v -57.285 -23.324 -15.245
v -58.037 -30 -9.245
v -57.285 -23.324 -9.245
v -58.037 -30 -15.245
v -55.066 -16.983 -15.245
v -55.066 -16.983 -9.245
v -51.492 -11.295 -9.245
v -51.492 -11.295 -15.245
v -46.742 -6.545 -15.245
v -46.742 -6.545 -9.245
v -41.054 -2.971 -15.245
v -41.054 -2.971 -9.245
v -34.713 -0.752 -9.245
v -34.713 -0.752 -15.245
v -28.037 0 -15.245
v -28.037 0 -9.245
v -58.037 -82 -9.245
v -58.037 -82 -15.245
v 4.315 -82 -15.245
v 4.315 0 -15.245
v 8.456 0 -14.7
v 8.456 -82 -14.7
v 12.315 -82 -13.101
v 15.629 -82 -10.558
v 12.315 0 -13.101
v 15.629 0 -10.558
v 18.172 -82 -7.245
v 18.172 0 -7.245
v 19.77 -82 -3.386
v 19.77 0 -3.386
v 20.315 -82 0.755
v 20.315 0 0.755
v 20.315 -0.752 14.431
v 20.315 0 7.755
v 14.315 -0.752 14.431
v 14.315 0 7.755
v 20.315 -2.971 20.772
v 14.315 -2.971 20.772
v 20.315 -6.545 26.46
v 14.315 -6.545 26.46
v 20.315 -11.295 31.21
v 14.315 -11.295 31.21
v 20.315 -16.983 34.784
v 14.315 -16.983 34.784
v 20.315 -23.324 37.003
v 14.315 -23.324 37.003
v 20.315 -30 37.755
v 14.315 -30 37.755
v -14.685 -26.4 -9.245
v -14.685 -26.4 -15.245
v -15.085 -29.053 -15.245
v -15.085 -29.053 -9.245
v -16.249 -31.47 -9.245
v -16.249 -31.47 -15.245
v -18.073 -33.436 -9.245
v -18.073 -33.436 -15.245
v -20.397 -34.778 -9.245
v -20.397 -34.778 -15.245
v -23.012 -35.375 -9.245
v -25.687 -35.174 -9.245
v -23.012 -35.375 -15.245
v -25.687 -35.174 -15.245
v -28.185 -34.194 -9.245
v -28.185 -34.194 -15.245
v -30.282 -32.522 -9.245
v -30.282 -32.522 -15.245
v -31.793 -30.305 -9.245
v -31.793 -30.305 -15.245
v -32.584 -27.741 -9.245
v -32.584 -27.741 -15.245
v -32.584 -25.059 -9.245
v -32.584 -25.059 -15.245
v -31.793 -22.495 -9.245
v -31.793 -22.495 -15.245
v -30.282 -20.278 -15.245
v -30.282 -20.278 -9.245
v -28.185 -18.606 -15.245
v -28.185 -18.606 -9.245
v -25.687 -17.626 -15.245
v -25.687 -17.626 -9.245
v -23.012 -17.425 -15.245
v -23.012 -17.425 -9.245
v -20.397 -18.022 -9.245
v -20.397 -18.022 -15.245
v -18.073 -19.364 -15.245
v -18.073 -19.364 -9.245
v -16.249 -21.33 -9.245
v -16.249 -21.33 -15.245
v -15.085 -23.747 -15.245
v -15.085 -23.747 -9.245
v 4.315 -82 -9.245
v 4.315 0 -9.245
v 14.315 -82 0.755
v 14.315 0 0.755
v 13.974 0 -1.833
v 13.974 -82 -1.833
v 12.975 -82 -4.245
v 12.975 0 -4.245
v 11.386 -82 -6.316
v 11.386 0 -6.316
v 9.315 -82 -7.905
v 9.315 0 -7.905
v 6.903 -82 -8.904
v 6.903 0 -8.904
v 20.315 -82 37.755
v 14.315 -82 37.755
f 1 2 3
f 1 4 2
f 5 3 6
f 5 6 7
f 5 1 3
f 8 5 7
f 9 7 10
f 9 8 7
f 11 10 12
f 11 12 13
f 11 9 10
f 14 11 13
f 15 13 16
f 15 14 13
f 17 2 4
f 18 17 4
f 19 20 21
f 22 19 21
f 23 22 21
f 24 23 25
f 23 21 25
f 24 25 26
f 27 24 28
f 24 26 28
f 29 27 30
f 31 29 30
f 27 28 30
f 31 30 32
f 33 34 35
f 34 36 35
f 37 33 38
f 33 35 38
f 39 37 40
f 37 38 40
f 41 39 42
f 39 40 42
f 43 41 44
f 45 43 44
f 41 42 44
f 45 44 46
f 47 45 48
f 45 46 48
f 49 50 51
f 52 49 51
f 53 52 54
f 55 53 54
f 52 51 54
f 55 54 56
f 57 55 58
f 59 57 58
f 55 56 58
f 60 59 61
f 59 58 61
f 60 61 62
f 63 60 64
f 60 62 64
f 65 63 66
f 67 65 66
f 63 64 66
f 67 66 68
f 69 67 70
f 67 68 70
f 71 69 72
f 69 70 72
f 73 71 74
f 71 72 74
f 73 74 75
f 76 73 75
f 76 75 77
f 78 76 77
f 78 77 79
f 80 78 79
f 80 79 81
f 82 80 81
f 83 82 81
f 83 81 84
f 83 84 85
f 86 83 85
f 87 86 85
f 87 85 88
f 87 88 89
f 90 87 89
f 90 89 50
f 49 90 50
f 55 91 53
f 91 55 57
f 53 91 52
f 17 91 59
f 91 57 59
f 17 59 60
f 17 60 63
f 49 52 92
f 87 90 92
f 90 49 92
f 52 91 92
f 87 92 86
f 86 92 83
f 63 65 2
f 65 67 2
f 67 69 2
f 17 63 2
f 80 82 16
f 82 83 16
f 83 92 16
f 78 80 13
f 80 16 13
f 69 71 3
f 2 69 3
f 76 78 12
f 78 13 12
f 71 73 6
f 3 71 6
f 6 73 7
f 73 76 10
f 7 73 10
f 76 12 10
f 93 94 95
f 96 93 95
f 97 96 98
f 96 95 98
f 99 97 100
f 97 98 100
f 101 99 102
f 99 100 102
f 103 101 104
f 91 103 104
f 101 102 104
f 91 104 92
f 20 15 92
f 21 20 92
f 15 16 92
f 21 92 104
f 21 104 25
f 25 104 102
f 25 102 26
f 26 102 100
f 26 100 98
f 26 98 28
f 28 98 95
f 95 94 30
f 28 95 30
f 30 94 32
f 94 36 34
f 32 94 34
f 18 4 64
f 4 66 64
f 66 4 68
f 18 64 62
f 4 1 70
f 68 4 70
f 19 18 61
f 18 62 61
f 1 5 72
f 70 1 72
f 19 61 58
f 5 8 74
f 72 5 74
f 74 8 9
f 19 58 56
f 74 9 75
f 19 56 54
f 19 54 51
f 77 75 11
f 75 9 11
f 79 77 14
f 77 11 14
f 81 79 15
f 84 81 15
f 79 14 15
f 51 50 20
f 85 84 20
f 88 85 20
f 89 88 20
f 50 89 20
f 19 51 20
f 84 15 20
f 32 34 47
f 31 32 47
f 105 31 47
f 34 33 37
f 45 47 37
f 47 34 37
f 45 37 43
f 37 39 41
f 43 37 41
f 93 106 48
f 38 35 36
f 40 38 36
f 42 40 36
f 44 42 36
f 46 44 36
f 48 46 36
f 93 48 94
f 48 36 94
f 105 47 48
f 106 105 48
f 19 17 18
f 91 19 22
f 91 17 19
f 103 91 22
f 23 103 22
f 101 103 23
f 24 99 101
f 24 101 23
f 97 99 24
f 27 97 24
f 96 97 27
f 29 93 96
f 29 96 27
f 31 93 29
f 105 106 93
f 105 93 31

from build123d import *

# Parameters (mm, degrees)
F1_DEPTH = 82
F2_R     = 9
F3_DEPTH = 25
F4_R     = 30


with BuildPart() as f1:
    # F0 (on Front) → F1 (new body)
    with BuildSketch(Plane.XZ):
        with BuildLine():
            Line((-58.036997, -9.244789), (-58.036997, -15.244789))
            Line((-58.036997, -15.244789), (4.315235, -15.244789))
            ThreePointArc((4.315235, -15.244789), (15.628944, -10.558497), (20.315235, 0.755211))
            Line((20.315235, 0.755211), (20.315235, 37.755211))
            Line((20.315235, 37.755211), (14.315235, 37.755211))
            Line((14.315235, 37.755211), (14.315235, 0.755211))
            ThreePointArc((14.315235, 0.755211), (11.386303, -6.315856), (4.315235, -9.244789))
            Line((4.315235, -9.244789), (-58.036997, -9.244789))
        make_face()
    extrude(amount=F1_DEPTH)

    # F2 (on face) → F3 (cut)
    with BuildSketch(Plane(origin=(0, 0, -15.244789), x_dir=(1, 0, 0), z_dir=(0, 0, -1))):
        with Locations((-23.684765, 26.4)):
            Circle(F2_R)
    extrude(amount=-F3_DEPTH, mode=Mode.SUBTRACT)

    # F4
    f4_edges = [f1.edges().sort_by_distance(p)[0] for p in [
        (-58.036997, 0, -12.244789),
        (17.315235, 0, 37.755211),
    ]]
    fillet(f4_edges, radius=F4_R)


solid = f1.part
